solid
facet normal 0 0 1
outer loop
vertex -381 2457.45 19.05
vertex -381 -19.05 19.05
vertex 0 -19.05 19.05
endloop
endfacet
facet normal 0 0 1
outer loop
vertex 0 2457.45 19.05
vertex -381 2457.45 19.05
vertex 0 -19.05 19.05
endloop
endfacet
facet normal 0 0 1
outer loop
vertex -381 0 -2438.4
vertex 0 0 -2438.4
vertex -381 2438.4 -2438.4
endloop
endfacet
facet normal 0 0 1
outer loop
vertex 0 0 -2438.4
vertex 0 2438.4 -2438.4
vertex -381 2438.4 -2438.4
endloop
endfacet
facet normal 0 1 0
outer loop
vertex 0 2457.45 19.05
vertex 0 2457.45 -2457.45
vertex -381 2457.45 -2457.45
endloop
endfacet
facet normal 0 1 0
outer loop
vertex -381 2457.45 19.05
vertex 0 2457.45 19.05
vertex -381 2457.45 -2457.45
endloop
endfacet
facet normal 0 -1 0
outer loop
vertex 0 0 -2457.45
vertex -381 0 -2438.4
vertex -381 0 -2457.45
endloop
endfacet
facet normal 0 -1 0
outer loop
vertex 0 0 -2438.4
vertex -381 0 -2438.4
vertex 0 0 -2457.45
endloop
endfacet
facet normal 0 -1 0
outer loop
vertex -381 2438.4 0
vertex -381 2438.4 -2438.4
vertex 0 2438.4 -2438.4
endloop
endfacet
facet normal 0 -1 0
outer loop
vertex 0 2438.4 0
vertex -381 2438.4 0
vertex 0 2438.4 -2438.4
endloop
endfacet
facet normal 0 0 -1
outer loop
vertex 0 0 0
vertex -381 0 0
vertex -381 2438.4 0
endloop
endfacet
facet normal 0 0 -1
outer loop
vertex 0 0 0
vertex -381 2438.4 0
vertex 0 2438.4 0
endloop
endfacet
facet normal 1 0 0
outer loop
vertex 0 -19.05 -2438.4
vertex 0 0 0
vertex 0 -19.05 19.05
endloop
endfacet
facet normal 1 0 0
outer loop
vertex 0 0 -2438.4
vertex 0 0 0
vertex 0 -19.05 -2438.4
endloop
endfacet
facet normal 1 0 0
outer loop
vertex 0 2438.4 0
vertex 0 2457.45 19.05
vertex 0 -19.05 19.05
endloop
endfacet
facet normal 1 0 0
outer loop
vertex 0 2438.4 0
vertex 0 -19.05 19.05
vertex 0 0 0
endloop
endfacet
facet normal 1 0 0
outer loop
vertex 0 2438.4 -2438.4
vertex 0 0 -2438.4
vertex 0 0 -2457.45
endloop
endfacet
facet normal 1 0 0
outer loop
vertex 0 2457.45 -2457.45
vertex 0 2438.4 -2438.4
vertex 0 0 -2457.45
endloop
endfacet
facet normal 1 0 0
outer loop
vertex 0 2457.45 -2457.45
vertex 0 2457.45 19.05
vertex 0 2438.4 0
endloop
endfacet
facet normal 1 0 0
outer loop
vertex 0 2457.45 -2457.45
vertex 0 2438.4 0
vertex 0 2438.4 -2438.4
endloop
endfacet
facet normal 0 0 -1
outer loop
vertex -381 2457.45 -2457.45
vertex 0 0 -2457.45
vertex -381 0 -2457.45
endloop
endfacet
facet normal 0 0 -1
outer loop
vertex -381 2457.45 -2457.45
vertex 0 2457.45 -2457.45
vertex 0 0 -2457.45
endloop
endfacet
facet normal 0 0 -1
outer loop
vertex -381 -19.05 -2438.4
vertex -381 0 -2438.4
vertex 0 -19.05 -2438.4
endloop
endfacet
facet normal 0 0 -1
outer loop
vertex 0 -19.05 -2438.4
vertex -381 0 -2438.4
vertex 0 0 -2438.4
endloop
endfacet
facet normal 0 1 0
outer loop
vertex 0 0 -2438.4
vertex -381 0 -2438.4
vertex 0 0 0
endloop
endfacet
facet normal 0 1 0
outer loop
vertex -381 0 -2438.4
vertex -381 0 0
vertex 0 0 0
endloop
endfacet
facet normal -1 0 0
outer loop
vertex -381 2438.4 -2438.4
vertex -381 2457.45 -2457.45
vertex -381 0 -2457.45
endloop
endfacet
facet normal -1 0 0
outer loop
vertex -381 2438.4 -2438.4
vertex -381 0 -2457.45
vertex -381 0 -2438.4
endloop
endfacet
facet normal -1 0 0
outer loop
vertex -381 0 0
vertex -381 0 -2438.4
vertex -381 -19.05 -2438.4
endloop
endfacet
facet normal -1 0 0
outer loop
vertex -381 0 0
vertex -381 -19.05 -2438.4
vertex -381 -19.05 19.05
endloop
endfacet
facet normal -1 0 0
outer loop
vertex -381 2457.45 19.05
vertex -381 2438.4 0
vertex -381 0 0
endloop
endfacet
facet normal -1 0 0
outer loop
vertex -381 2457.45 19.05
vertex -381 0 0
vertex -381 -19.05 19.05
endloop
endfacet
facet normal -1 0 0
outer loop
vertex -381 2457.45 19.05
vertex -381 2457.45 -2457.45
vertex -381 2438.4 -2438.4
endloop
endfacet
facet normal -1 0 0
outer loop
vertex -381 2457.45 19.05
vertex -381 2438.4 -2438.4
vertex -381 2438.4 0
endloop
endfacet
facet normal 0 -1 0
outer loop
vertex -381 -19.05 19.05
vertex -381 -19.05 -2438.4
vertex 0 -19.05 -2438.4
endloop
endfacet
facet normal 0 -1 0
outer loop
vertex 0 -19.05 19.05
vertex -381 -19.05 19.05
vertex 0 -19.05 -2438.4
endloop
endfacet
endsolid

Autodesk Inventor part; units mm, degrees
ref_plane "YZ Plane" through (0, 0, 0) normal (1, 0, 0) x (0, 1, 0)
ref_plane "XZ Plane" through (0, 0, 0) normal (0, 1, 0) x (-1, 0, 0)
ref_plane "XY Plane" through (0, 0, 0) normal (0, 0, 1) x (1, 0, 0)
sketch "Sketch1" plane through (0, 0, 0) normal (0, 0, 1) x (1, 0, 0)
  line L0 (0, 0) -> (-381, 0)
  line L1 (-381, 0) -> (-381, 2438.4)
  line L2 (-381, 2438.4) -> (0, 2438.4)
  line L3 (0, 2438.4) -> (0, 0)
  dimension "d0" = 2438.4
  dimension "d1" = 381
extrude "Extrusion1" add sketch "Sketch1" along normal blind 19.05
sketch "Sketch2" plane through (-381, 2438.4, 0) normal (0, 1, 0) x (1, 0, 0)
  line L0 (381, 0) -> (381, 2438.4) projected
  line L1 (381, -19.05) -> (0, -19.05) projected
  line L2 (381, -19.05) -> (0, -19.05)
  line L3 (0, -19.05) -> (0, 2438.4)
  line L4 (0, 2438.4) -> (381, 2438.4)
  line L5 (381, 2438.4) -> (381, -19.05)
extrude "Extrusion2" add sketch "Sketch2" along normal blind 19.05
sketch "Sketch3" plane through (0, 2438.4, -2438.4) normal (0, 0, -1) x (-1, 0, 0)
  line L0 (0, 0) -> (0, -2438.4) projected
  line L1 (0, 19.05) -> (381, 19.05) projected
  line L2 (0, 19.05) -> (381, 19.05)
  line L3 (381, 19.05) -> (381, -2438.4)
  line L4 (381, -2438.4) -> (0, -2438.4)
  line L5 (0, -2438.4) -> (0, 19.05)
extrude "Extrusion3" add sketch "Sketch3" along normal blind 19.05
sketch "Sketch4" plane through (-381, 0, -2438.4) normal (0, -1, 0) x (1, 0, 0)
  line L0 (0, 0) -> (381, 0) projected
  line L1 (0, 0) -> (0, -19.05) projected
  line L2 (381, -19.05) -> (0, -19.05) projected
  line L3 (381, 0) -> (381, -19.05) projected
  line L4 (0, 2457.45) -> (381, 2457.45) projected
  line L5 (381, 0) -> (381, -19.05) projected
  line L6 (381, -19.05) -> (0, -19.05)
  line L7 (0, -19.05) -> (0, 2457.45)
  line L8 (0, 2457.45) -> (381, 2457.45)
  line L9 (381, 2457.45) -> (381, -19.05)
  point P0 (381, 2438.4)
extrude "Extrusion4" add sketch "Sketch4" along normal blind 19.05 contours L7 L4 L9 L0
properties part number "Walls"
